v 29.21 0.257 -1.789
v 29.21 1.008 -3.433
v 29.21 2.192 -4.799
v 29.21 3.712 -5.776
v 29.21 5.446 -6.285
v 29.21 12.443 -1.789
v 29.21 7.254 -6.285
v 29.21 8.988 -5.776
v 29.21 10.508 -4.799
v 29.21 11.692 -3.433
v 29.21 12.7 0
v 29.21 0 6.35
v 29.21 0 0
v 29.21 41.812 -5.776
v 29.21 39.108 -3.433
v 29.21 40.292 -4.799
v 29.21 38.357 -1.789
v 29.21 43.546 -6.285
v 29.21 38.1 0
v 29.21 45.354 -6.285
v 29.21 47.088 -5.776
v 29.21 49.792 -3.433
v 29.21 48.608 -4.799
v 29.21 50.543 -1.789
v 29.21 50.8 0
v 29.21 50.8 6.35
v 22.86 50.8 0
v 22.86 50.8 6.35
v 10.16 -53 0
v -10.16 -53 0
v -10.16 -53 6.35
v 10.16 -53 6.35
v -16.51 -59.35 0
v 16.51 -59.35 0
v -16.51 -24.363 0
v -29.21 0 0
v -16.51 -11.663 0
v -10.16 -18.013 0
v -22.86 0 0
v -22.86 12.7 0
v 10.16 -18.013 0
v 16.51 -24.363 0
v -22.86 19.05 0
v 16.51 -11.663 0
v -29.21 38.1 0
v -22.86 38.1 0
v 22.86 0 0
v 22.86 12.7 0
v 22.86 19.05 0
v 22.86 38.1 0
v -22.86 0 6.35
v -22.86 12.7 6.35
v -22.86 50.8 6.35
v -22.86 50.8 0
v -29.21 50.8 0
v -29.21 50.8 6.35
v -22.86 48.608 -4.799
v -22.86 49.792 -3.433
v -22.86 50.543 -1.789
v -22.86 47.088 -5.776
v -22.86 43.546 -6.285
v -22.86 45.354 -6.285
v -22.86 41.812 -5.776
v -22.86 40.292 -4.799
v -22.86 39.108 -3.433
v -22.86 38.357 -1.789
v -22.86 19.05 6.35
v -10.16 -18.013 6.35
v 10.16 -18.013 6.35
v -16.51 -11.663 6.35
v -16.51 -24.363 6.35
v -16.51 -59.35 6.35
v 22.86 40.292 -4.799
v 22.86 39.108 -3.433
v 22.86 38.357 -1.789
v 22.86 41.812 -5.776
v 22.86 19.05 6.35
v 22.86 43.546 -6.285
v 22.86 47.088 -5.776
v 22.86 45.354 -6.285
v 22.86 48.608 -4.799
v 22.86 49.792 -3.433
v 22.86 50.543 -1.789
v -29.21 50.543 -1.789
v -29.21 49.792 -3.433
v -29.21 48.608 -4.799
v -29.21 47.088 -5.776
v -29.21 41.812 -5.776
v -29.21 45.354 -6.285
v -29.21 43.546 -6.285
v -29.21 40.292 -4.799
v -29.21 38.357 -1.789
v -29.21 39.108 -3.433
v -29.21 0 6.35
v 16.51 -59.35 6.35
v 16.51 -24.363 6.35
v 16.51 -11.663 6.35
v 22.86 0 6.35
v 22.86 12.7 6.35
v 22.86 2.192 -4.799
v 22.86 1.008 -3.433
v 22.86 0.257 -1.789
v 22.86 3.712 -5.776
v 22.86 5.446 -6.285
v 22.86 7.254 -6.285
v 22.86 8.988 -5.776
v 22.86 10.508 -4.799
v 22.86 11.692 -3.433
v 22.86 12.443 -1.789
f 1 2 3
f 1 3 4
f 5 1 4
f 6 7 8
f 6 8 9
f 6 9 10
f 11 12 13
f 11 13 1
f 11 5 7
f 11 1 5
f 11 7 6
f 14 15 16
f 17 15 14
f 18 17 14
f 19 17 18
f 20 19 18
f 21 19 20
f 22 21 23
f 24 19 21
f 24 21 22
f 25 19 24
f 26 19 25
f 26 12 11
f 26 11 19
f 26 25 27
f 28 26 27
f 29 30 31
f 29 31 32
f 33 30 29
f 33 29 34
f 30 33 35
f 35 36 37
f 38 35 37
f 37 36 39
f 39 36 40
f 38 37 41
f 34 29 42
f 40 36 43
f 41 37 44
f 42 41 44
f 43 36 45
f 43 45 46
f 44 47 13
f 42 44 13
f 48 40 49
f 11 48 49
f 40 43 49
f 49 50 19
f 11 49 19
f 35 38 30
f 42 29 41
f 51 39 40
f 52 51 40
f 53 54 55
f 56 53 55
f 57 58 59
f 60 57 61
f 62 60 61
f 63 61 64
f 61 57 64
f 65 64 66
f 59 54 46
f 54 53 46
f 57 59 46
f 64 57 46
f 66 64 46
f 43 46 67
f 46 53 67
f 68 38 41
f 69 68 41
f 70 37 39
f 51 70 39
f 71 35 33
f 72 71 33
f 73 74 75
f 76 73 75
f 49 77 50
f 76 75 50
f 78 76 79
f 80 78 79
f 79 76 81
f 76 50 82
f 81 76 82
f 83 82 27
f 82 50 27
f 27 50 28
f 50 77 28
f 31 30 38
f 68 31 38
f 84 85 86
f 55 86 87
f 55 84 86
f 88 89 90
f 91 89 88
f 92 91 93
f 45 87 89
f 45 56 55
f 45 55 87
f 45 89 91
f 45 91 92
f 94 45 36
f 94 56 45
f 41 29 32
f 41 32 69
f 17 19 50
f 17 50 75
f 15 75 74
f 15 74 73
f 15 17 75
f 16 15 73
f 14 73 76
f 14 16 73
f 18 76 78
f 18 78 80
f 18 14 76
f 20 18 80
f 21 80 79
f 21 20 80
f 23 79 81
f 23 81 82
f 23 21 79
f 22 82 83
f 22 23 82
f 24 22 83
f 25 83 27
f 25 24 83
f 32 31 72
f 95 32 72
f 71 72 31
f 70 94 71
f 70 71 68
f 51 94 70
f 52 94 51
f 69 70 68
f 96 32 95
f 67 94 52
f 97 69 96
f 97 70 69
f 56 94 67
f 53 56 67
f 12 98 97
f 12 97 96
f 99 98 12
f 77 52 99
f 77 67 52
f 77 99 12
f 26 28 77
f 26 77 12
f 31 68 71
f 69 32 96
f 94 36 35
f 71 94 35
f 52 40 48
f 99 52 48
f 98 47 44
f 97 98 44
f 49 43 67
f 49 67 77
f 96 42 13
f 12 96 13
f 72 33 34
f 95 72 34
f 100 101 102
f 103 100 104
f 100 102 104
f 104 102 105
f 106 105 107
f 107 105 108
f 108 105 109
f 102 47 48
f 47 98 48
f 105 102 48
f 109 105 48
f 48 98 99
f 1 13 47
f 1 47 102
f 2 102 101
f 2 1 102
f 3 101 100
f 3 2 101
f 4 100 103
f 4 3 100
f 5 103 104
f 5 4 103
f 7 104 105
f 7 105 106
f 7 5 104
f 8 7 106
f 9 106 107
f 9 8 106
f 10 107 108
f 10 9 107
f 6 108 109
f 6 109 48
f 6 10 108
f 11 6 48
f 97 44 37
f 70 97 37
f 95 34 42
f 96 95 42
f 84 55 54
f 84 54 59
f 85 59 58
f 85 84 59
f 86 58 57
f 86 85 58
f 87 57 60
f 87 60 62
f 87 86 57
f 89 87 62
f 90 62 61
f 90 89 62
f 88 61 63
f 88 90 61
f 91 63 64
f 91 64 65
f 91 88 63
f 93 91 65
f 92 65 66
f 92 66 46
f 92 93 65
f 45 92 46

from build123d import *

# Parameters (mm, degrees)
F0_W     = 45.72
F0_H     = 6.35
F0_W_2   = 20.32
F0_H_2   = 34.987604
F1_DEPTH = 6.35
F3_DEPTH = 6.35
F5_DEPTH = 6.35


with BuildPart() as f1:
    # F0 (on Top) → F1 (new body)
    with BuildSketch(Plane.XY):
        Polygon((-22.86, 50.8), (-29.21, 50.8), (-29.21, 0), (-22.86, 0), (-22.86, 12.7), (-22.86, 19.05), align=None)
        Polygon((-22.86, 0), (-29.21, 0), (-16.51, -24.362533), (-16.51, -11.662533), align=None)
        with Locations((0, 15.875)):
            Rectangle(F0_W, F0_H)
        Polygon((-16.51, -11.662533), (-16.51, -24.362533), (-16.51, -59.350137), (16.51, -59.350137), (16.51, -24.362533), (16.51, -11.662533), align=None)
        with Locations((0, -35.506335)):
            Rectangle(F0_W_2, F0_H_2, mode=Mode.SUBTRACT)
        Polygon((22.86, 50.8), (22.86, 19.05), (22.86, 12.7), (22.86, 0), (29.21, 0), (29.21, 50.8), align=None)
        Polygon((22.86, 0), (16.51, -11.662533), (16.51, -24.362533), (29.21, 0), align=None)
    extrude(amount=F1_DEPTH)

    # F2 (on face) → F3 (join)
    with BuildSketch(Plane.YZ.offset(29.21)):
        with BuildLine():
            Line((50.8, 0), (38.1, 0))
            ThreePointArc((38.1, 0), (44.45, -6.35), (50.8, 0))
        make_face()
        with BuildLine():
            Line((12.7, 0), (0, 0))
            ThreePointArc((0, 0), (6.35, -6.35), (12.7, 0))
        make_face()
    extrude(amount=-F3_DEPTH)

    # F4 (on face) → F5 (join)
    with BuildSketch(Plane(origin=(-29.21, 0, 0), x_dir=(0, -1, 0), z_dir=(-1, 0, 0))):
        with BuildLine():
            Line((-38.1, 0), (-50.8, 0))
            ThreePointArc((-50.8, 0), (-44.45, -6.35), (-38.1, 0))
        make_face()
    extrude(amount=-F5_DEPTH)


solid = f1.part
